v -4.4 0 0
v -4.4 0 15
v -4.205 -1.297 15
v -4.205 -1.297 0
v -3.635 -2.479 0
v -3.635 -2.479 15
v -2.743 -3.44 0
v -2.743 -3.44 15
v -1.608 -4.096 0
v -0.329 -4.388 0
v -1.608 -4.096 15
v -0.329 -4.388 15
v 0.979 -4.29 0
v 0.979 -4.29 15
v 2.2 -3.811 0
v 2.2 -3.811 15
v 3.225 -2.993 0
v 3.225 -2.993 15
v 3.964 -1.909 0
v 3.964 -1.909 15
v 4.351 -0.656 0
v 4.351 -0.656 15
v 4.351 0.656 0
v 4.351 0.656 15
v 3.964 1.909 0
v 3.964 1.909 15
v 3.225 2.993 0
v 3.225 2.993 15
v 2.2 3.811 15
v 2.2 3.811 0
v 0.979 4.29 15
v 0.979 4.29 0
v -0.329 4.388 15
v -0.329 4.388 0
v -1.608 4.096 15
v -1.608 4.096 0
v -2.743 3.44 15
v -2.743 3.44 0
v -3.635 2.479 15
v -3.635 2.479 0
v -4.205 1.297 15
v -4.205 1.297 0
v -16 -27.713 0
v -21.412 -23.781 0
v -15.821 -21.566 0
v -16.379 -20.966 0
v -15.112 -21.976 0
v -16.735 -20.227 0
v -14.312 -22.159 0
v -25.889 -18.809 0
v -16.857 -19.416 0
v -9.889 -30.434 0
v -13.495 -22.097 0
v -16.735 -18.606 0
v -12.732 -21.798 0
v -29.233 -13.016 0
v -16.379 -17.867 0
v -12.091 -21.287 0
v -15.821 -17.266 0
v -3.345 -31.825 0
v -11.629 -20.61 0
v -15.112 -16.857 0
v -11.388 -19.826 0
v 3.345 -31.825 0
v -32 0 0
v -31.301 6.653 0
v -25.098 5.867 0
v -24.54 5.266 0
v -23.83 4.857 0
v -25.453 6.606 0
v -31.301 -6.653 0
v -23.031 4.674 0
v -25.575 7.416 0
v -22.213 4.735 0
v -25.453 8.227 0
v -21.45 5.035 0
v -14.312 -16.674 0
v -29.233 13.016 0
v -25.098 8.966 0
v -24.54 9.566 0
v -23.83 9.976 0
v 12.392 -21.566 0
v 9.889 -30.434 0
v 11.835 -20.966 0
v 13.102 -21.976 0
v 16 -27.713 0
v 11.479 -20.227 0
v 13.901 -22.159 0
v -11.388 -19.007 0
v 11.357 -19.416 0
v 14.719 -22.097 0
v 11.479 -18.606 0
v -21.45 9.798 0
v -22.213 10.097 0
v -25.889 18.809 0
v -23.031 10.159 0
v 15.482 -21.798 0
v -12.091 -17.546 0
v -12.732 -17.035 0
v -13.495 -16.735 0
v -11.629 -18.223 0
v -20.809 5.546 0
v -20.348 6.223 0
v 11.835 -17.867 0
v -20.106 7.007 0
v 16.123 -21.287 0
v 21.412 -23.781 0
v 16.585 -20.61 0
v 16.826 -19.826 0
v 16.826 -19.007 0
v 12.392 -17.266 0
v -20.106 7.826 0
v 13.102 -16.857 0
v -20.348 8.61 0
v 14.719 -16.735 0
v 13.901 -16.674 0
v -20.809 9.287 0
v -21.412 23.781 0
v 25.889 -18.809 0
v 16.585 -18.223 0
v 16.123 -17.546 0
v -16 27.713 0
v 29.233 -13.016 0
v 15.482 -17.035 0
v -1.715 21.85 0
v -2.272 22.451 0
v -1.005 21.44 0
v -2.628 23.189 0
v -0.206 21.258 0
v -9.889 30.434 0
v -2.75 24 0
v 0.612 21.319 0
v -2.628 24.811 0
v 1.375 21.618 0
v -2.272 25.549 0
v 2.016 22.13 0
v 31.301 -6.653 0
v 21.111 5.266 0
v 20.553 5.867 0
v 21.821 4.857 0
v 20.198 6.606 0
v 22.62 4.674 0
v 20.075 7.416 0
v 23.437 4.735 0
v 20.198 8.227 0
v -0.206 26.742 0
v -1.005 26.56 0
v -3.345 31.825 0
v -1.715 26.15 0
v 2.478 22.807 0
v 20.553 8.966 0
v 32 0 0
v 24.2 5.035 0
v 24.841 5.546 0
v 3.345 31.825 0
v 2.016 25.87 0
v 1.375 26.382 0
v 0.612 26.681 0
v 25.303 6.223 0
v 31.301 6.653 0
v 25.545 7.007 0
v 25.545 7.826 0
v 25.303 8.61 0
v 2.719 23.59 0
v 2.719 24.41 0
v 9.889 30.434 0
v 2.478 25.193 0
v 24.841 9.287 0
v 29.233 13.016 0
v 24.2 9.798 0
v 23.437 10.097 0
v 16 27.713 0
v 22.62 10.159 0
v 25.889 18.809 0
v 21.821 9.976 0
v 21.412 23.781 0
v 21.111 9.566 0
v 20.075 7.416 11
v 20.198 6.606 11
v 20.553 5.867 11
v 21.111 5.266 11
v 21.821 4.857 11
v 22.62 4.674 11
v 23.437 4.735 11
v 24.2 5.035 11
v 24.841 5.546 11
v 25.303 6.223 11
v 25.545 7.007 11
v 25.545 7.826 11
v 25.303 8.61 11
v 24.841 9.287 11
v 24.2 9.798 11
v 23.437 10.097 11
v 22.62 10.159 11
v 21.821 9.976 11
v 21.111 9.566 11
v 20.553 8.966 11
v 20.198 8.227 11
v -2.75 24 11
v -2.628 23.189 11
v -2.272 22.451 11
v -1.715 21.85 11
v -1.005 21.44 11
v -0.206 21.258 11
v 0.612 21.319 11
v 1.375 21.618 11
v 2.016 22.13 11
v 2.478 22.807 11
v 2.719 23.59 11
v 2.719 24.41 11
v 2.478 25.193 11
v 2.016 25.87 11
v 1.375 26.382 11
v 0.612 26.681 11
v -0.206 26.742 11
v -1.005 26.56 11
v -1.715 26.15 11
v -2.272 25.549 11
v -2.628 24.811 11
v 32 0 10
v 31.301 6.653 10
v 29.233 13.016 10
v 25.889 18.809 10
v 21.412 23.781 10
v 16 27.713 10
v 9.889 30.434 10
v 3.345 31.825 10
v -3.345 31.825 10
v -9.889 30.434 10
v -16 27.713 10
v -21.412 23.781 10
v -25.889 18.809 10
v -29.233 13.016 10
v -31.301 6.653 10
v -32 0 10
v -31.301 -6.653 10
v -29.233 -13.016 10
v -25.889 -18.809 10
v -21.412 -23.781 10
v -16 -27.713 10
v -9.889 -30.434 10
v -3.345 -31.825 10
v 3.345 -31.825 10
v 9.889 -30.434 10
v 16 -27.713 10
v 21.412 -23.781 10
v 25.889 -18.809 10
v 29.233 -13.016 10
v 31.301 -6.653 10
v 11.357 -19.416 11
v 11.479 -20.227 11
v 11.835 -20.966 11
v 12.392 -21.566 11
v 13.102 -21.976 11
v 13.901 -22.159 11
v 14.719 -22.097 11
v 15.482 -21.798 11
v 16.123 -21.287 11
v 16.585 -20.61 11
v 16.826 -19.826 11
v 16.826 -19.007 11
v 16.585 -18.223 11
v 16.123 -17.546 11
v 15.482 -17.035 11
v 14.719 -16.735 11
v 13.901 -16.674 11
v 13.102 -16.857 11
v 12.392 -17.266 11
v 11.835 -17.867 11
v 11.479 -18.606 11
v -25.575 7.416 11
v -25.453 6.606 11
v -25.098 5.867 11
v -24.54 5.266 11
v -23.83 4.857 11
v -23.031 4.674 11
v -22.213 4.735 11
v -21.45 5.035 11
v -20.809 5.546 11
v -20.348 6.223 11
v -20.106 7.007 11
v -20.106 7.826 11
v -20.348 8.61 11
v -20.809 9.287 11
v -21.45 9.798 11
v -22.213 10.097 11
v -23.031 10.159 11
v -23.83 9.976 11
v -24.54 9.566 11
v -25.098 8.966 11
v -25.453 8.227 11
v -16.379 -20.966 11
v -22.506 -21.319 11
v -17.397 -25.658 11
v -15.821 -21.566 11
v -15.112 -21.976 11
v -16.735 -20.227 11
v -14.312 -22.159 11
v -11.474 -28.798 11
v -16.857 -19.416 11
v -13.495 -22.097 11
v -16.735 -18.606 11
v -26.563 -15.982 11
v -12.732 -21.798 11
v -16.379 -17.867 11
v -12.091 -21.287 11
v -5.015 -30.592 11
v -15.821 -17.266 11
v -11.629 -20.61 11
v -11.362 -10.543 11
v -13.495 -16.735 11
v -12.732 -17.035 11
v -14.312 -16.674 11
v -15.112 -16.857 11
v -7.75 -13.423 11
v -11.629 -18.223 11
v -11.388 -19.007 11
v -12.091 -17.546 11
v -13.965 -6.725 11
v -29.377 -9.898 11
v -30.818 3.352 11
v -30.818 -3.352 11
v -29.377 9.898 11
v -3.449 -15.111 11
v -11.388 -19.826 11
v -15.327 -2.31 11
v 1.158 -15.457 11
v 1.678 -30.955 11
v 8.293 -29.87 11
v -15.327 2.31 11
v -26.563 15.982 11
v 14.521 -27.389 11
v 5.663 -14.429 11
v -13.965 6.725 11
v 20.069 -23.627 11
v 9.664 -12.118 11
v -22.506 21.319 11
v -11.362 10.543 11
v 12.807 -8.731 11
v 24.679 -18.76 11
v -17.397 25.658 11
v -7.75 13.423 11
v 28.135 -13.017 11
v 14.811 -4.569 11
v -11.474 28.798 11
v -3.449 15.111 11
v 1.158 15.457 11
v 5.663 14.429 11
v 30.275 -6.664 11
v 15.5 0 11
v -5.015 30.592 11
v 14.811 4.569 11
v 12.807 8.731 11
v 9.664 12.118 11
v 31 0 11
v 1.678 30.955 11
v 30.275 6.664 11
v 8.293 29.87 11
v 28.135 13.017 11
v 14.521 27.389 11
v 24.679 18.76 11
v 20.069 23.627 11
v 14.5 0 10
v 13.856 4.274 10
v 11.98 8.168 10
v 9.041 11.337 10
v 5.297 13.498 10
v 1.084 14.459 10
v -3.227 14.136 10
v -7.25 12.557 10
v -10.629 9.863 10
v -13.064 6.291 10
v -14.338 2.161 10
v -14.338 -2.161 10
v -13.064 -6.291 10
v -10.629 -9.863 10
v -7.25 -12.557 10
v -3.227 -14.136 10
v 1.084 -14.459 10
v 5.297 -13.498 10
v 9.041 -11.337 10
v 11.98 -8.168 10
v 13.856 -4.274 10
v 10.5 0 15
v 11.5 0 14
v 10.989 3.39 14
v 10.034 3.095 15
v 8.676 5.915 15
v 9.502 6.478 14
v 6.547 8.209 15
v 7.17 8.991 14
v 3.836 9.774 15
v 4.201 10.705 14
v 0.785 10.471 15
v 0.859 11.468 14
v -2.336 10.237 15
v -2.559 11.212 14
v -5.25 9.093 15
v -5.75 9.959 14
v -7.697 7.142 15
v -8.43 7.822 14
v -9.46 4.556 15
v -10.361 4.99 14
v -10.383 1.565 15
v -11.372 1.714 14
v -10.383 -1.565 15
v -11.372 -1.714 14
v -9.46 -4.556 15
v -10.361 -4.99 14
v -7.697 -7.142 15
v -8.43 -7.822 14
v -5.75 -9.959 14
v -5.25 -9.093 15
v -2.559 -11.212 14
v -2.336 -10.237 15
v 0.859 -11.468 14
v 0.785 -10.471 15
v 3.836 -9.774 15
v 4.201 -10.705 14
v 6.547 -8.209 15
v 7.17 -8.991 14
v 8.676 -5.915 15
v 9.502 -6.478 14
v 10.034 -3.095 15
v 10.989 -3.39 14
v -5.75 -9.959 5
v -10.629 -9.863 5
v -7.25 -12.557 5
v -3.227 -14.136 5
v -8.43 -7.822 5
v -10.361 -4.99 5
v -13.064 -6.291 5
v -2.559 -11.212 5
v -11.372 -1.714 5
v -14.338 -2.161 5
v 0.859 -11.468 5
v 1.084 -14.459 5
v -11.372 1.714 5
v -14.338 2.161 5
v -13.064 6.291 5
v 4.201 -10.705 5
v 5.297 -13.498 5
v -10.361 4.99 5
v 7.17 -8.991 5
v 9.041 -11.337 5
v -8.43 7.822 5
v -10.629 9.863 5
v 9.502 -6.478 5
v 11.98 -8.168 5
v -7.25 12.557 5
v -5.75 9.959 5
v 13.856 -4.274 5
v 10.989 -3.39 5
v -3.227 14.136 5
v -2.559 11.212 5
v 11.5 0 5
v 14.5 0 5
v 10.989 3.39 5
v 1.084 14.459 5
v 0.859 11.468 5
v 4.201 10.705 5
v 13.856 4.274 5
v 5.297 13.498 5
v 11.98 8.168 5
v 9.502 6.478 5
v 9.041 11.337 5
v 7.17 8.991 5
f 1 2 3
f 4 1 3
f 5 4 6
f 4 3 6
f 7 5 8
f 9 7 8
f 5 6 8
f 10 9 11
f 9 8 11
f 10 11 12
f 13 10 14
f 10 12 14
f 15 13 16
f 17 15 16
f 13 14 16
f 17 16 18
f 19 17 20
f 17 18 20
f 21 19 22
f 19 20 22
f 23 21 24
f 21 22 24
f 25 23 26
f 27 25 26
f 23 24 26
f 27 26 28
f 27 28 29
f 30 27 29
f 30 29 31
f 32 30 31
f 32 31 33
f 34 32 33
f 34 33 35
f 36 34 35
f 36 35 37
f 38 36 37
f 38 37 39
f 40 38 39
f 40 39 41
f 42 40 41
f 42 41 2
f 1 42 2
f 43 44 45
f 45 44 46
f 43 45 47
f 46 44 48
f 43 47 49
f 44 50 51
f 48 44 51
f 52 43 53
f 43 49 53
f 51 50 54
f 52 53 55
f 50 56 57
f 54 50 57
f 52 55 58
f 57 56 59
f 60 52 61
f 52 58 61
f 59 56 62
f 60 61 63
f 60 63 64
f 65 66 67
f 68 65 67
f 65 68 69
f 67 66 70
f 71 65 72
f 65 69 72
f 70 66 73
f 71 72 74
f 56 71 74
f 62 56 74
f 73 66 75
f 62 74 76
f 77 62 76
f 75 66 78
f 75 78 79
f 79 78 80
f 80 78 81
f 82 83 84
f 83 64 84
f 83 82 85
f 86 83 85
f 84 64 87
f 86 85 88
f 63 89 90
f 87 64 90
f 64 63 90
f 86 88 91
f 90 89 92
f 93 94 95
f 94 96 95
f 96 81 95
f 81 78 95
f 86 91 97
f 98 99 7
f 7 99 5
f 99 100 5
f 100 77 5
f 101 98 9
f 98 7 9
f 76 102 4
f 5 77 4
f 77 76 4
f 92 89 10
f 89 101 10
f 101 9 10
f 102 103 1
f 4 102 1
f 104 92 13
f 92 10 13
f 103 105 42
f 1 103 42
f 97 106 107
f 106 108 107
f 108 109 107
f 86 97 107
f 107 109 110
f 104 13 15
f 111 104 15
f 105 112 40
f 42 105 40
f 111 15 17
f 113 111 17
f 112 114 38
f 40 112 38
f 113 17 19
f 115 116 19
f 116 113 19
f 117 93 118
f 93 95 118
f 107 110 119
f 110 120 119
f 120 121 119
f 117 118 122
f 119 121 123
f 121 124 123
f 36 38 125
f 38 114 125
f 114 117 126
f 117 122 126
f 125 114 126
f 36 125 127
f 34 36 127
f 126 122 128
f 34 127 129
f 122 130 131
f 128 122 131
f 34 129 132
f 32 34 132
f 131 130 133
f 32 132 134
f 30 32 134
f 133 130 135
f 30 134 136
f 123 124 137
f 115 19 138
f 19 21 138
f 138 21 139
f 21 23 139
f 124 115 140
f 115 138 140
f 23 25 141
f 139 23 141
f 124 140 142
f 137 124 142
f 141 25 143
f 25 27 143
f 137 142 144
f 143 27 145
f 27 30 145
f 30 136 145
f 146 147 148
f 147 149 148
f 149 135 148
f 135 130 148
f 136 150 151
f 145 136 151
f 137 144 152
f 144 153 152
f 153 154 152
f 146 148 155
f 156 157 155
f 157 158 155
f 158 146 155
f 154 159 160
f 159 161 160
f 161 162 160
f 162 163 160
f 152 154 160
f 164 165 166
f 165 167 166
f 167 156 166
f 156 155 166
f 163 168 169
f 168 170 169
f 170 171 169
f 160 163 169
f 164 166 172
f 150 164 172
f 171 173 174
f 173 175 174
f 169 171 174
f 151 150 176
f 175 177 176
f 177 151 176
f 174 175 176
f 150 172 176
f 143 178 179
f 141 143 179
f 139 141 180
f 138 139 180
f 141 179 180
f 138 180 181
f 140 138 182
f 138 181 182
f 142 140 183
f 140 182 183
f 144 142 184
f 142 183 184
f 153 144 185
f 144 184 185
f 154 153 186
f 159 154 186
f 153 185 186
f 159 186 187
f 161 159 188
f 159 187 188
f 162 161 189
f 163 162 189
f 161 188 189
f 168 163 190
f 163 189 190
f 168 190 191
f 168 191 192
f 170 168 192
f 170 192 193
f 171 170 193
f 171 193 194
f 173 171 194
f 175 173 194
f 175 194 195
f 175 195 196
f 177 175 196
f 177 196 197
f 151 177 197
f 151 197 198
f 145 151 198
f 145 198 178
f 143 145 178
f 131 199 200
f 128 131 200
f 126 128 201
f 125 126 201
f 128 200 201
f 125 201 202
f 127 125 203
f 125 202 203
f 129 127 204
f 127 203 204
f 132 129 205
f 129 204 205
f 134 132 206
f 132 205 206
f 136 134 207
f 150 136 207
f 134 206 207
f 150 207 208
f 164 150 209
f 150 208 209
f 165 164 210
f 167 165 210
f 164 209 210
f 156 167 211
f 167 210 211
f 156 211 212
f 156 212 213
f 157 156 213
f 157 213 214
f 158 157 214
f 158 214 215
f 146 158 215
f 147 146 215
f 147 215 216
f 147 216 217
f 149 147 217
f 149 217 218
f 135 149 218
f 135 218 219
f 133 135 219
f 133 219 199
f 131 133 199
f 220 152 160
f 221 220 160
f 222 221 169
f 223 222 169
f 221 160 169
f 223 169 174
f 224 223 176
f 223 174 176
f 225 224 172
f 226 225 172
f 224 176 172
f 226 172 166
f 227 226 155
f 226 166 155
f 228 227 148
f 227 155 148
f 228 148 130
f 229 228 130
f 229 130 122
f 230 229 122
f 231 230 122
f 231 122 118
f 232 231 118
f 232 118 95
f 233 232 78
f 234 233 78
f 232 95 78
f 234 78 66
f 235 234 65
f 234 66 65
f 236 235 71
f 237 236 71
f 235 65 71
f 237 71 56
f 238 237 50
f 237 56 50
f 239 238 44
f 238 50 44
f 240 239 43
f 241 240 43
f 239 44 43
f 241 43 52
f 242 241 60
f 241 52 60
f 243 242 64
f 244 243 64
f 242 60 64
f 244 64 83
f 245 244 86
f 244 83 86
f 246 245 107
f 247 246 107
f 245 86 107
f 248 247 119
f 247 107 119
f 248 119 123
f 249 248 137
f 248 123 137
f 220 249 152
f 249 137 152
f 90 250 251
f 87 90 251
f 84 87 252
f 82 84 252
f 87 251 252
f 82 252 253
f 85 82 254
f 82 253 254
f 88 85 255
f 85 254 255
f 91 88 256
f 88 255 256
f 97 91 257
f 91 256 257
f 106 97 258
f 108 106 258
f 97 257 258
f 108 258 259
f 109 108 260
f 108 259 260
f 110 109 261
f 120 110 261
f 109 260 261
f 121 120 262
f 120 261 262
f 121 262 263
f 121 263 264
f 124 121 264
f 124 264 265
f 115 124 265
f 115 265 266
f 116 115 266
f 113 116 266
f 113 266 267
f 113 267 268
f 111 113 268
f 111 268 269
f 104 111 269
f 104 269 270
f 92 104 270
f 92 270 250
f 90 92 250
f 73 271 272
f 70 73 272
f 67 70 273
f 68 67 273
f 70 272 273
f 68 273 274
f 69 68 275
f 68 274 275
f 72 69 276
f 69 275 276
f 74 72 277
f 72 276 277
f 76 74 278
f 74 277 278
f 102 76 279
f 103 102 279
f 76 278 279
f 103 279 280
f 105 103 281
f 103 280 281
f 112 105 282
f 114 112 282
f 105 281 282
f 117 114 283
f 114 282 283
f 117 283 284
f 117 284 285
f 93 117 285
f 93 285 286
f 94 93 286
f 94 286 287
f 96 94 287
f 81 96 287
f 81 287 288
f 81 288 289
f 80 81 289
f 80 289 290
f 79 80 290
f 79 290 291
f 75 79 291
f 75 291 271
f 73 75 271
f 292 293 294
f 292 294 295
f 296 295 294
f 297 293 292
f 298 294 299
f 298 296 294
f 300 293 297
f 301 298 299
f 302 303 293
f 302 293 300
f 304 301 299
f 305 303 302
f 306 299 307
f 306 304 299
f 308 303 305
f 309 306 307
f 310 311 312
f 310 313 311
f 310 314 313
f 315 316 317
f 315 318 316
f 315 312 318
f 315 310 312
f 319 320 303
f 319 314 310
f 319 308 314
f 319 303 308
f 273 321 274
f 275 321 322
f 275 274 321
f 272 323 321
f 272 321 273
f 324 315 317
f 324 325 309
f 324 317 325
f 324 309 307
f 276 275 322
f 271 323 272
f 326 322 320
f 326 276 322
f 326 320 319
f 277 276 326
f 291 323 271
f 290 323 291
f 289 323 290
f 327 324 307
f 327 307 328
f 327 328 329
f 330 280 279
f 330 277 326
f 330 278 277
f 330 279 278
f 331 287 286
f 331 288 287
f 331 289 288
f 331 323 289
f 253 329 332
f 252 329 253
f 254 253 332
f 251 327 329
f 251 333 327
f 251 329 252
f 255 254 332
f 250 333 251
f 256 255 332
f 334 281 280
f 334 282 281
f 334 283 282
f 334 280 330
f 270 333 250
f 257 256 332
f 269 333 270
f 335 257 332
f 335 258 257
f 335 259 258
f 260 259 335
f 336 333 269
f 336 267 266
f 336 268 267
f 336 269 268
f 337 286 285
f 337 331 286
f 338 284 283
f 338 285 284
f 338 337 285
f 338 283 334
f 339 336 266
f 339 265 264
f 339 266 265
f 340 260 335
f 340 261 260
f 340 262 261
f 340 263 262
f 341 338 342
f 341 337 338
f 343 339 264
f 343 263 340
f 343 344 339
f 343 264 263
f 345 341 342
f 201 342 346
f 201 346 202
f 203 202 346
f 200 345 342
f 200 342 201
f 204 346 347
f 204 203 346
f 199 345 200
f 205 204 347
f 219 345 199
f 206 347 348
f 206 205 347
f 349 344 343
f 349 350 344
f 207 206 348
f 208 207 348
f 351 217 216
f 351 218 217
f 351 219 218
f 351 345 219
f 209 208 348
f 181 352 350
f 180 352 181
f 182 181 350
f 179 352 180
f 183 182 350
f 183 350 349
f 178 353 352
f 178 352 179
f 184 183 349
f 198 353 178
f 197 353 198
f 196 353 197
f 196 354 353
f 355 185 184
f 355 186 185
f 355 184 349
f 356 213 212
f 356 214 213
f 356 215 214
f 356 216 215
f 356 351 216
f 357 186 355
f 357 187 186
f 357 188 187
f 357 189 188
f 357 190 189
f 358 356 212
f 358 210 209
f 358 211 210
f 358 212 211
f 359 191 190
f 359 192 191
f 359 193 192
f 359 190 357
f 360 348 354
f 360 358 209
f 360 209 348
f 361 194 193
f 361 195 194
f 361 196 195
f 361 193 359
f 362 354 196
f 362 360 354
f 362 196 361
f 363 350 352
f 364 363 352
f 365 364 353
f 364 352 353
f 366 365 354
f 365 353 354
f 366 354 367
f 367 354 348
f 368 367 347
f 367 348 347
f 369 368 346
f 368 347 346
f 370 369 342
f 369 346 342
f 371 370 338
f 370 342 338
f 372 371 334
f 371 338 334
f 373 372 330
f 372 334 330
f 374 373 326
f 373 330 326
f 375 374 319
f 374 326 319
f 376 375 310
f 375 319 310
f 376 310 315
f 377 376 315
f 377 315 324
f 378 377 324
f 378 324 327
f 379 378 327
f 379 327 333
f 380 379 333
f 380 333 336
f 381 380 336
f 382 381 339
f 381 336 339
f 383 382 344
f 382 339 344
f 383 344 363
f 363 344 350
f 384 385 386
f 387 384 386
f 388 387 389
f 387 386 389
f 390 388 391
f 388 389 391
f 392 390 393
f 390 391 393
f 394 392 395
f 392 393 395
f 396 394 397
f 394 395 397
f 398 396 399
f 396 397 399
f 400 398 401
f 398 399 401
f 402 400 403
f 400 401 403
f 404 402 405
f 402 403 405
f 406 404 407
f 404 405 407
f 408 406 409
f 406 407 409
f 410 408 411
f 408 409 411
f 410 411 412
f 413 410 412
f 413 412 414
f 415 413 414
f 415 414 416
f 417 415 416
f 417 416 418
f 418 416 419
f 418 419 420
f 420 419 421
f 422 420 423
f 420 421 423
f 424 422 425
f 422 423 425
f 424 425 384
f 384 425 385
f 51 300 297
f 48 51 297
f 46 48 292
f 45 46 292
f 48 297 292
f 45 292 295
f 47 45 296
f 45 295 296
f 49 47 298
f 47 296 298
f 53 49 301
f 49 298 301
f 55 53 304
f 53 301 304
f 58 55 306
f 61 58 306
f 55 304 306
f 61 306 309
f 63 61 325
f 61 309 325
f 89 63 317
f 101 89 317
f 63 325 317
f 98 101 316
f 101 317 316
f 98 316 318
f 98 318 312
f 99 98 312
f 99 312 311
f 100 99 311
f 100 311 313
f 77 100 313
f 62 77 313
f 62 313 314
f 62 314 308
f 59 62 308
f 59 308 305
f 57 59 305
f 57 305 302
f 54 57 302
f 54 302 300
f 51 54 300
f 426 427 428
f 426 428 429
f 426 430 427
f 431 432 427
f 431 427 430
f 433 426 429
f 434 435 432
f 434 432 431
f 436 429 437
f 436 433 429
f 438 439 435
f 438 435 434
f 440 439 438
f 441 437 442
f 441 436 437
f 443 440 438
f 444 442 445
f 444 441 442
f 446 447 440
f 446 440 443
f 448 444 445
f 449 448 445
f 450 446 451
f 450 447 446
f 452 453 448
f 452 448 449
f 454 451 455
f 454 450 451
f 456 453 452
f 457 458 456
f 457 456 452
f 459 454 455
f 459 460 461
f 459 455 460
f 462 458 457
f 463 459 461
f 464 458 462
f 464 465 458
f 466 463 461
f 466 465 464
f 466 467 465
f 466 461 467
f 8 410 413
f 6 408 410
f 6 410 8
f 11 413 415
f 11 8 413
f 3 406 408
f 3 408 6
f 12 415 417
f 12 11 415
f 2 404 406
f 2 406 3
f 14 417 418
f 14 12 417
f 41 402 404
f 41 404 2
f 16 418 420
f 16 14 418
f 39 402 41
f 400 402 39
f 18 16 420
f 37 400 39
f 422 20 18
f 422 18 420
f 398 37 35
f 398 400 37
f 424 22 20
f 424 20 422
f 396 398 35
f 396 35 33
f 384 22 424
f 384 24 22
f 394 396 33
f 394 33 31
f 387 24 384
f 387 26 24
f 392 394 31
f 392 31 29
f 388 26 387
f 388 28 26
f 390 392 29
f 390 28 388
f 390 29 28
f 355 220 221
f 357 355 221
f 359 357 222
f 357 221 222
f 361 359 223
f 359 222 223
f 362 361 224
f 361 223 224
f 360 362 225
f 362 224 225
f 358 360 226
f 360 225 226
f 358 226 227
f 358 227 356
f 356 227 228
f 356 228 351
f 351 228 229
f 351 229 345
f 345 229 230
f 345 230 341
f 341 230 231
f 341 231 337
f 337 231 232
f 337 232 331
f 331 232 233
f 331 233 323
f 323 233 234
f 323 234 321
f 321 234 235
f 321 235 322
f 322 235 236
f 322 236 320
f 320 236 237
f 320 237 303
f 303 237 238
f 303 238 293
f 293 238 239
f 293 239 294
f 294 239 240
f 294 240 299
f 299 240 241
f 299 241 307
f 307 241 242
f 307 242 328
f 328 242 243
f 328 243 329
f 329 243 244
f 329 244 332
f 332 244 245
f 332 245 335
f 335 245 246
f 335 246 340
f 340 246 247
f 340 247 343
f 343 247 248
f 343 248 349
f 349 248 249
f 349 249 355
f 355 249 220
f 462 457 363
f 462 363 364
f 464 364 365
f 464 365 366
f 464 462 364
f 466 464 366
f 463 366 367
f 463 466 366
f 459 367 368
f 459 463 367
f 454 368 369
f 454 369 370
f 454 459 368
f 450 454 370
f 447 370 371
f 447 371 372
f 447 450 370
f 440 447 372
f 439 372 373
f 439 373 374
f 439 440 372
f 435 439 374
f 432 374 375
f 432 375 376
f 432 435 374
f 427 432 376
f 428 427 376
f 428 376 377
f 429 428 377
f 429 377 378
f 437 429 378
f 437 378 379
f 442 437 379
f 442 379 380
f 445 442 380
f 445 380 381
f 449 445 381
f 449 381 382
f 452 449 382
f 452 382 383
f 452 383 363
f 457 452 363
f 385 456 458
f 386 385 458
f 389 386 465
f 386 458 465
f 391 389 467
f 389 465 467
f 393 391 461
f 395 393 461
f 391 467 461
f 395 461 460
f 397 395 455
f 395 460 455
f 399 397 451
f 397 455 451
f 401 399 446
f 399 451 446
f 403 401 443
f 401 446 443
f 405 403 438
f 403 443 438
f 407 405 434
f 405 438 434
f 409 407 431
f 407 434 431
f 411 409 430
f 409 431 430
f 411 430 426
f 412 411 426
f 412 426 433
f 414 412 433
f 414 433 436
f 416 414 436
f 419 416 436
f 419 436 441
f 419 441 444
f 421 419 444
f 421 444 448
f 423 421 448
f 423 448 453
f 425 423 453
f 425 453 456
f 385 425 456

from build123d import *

# Parameters (mm, degrees)
F0_R     = 11.5
F1_DEPTH = 15
F0_R_2   = 14.5
F2_DEPTH = 5
F0_R_3   = 32
F3_DEPTH = 11
F4_D     = 5.5
F5_D     = 8.8
F6_SIZE  = 1
F7_SIZE  = 1
F8_SIZE  = 1


with BuildPart() as f1:
    # F0 (on Top) → F1 (new body)
    with BuildSketch(Plane.XY):
        Circle(F0_R)
    extrude(amount=F1_DEPTH)

    # F0 (on Top) → F2 (join)
    with BuildSketch(Plane.XY):
        Circle(F0_R_2)
        Circle(F0_R, mode=Mode.SUBTRACT)
    extrude(amount=F2_DEPTH)

    # F0 (on Top) → F3 (join)
    with BuildSketch(Plane.XY):
        Circle(F0_R_3)
        Circle(F0_R_2, mode=Mode.SUBTRACT)
    extrude(amount=F3_DEPTH)

    # F4 (through all)
    with Locations(Plane(origin=(0, 0, 0), x_dir=(1, 0, 0), z_dir=(0, 0, -1))):
        with Locations((-22.8253563911, -7.416407865), (0, -24), (22.8253563911, -7.416407865), (14.106846055, 19.416407865), (-14.106846055, 19.416407865)):
            Hole(F4_D / 2)

    # F5 (through all)
    with Locations(Plane(origin=(0, 0, 0), x_dir=(1, 0, 0), z_dir=(0, 0, -1))):
        with Locations((0, 0)):
            Hole(F5_D / 2)

    # F6
    f6_edges = [f1.edges().sort_by_distance(p)[0] for p in [
        (-11.5, 0, 15),
    ]]
    chamfer(f6_edges, length=F6_SIZE)

    # F7
    f7_edges = [f1.edges().sort_by_distance(p)[0] for p in [
        (-14.5, 0, 11),
    ]]
    chamfer(f7_edges, length=F7_SIZE)

    # F8
    f8_edges = [f1.edges().sort_by_distance(p)[0] for p in [
        (-32, 0, 11),
    ]]
    chamfer(f8_edges, length=F8_SIZE)


solid = f1.part
